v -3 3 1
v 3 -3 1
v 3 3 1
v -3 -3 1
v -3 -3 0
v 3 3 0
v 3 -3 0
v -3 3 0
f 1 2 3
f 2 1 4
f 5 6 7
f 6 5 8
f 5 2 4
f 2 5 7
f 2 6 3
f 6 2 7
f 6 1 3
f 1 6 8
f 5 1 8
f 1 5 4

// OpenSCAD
// 「刷るぞー」が書き出しに混ぜる四隅のアンカー ── 2026-08-31
// ============================================================
// 🔒 何のためか
//   CHITUBOX は読み込んだ物の bbox の中心をプレート中央へ置くので、放っておくと
//   刷る物は必ずまん中に載る。プレート上の位置を指定できず、フィルムの同じ所ばかり減る。
//   ⇒ **プレートの外の四隅にこの駒を 4 個混ぜて書き出す。**
//     4 個が原点対称なので bbox の中心はプレート中央と一致し、中央合わせで何も動かない。
//     ＝ 書き出した座標がそのまま生きる。
//
// ✅ 2026-08-31 実物で確認（CHITUBOX Basic V2.3 / ELEGOO Mars 3・chitubox_anchor_test.scad）
//   ・座標はそのまま生きた／縮小されなかった
//   ・スライス時に「モデルは印刷プラットフォームを超えていますが、続行するかどうか?」が
//     出るが「はい」で通る
//   ・⭐ アンカーは露光されない。体積 3.06ml → 2.91994ml（差 0.14ml ＝ アンカー 4 個ぶん）
//
// ⚠ 大きさを変えたら、上の体積の裏付けも取り直すこと。
//
//   openscad --backend=manifold -o ../surugo/anchor.stl hardware/anchor_mark.scad
//   （置き場は surugo/ の下。hardware/stl/ に置くと刷る物の一覧に出てしまうため）
// ============================================================
ANC   = 6.0;   // 一辺
ANC_T = 1.0;   // 厚み。プレートに接地する高さ。露光されないので薄くてよい

// 中心が原点に来るように置く（surugo の export が中心を cx, cy へ合わせるため）
translate([-ANC / 2, -ANC / 2, 0]) cube([ANC, ANC, ANC_T]);
